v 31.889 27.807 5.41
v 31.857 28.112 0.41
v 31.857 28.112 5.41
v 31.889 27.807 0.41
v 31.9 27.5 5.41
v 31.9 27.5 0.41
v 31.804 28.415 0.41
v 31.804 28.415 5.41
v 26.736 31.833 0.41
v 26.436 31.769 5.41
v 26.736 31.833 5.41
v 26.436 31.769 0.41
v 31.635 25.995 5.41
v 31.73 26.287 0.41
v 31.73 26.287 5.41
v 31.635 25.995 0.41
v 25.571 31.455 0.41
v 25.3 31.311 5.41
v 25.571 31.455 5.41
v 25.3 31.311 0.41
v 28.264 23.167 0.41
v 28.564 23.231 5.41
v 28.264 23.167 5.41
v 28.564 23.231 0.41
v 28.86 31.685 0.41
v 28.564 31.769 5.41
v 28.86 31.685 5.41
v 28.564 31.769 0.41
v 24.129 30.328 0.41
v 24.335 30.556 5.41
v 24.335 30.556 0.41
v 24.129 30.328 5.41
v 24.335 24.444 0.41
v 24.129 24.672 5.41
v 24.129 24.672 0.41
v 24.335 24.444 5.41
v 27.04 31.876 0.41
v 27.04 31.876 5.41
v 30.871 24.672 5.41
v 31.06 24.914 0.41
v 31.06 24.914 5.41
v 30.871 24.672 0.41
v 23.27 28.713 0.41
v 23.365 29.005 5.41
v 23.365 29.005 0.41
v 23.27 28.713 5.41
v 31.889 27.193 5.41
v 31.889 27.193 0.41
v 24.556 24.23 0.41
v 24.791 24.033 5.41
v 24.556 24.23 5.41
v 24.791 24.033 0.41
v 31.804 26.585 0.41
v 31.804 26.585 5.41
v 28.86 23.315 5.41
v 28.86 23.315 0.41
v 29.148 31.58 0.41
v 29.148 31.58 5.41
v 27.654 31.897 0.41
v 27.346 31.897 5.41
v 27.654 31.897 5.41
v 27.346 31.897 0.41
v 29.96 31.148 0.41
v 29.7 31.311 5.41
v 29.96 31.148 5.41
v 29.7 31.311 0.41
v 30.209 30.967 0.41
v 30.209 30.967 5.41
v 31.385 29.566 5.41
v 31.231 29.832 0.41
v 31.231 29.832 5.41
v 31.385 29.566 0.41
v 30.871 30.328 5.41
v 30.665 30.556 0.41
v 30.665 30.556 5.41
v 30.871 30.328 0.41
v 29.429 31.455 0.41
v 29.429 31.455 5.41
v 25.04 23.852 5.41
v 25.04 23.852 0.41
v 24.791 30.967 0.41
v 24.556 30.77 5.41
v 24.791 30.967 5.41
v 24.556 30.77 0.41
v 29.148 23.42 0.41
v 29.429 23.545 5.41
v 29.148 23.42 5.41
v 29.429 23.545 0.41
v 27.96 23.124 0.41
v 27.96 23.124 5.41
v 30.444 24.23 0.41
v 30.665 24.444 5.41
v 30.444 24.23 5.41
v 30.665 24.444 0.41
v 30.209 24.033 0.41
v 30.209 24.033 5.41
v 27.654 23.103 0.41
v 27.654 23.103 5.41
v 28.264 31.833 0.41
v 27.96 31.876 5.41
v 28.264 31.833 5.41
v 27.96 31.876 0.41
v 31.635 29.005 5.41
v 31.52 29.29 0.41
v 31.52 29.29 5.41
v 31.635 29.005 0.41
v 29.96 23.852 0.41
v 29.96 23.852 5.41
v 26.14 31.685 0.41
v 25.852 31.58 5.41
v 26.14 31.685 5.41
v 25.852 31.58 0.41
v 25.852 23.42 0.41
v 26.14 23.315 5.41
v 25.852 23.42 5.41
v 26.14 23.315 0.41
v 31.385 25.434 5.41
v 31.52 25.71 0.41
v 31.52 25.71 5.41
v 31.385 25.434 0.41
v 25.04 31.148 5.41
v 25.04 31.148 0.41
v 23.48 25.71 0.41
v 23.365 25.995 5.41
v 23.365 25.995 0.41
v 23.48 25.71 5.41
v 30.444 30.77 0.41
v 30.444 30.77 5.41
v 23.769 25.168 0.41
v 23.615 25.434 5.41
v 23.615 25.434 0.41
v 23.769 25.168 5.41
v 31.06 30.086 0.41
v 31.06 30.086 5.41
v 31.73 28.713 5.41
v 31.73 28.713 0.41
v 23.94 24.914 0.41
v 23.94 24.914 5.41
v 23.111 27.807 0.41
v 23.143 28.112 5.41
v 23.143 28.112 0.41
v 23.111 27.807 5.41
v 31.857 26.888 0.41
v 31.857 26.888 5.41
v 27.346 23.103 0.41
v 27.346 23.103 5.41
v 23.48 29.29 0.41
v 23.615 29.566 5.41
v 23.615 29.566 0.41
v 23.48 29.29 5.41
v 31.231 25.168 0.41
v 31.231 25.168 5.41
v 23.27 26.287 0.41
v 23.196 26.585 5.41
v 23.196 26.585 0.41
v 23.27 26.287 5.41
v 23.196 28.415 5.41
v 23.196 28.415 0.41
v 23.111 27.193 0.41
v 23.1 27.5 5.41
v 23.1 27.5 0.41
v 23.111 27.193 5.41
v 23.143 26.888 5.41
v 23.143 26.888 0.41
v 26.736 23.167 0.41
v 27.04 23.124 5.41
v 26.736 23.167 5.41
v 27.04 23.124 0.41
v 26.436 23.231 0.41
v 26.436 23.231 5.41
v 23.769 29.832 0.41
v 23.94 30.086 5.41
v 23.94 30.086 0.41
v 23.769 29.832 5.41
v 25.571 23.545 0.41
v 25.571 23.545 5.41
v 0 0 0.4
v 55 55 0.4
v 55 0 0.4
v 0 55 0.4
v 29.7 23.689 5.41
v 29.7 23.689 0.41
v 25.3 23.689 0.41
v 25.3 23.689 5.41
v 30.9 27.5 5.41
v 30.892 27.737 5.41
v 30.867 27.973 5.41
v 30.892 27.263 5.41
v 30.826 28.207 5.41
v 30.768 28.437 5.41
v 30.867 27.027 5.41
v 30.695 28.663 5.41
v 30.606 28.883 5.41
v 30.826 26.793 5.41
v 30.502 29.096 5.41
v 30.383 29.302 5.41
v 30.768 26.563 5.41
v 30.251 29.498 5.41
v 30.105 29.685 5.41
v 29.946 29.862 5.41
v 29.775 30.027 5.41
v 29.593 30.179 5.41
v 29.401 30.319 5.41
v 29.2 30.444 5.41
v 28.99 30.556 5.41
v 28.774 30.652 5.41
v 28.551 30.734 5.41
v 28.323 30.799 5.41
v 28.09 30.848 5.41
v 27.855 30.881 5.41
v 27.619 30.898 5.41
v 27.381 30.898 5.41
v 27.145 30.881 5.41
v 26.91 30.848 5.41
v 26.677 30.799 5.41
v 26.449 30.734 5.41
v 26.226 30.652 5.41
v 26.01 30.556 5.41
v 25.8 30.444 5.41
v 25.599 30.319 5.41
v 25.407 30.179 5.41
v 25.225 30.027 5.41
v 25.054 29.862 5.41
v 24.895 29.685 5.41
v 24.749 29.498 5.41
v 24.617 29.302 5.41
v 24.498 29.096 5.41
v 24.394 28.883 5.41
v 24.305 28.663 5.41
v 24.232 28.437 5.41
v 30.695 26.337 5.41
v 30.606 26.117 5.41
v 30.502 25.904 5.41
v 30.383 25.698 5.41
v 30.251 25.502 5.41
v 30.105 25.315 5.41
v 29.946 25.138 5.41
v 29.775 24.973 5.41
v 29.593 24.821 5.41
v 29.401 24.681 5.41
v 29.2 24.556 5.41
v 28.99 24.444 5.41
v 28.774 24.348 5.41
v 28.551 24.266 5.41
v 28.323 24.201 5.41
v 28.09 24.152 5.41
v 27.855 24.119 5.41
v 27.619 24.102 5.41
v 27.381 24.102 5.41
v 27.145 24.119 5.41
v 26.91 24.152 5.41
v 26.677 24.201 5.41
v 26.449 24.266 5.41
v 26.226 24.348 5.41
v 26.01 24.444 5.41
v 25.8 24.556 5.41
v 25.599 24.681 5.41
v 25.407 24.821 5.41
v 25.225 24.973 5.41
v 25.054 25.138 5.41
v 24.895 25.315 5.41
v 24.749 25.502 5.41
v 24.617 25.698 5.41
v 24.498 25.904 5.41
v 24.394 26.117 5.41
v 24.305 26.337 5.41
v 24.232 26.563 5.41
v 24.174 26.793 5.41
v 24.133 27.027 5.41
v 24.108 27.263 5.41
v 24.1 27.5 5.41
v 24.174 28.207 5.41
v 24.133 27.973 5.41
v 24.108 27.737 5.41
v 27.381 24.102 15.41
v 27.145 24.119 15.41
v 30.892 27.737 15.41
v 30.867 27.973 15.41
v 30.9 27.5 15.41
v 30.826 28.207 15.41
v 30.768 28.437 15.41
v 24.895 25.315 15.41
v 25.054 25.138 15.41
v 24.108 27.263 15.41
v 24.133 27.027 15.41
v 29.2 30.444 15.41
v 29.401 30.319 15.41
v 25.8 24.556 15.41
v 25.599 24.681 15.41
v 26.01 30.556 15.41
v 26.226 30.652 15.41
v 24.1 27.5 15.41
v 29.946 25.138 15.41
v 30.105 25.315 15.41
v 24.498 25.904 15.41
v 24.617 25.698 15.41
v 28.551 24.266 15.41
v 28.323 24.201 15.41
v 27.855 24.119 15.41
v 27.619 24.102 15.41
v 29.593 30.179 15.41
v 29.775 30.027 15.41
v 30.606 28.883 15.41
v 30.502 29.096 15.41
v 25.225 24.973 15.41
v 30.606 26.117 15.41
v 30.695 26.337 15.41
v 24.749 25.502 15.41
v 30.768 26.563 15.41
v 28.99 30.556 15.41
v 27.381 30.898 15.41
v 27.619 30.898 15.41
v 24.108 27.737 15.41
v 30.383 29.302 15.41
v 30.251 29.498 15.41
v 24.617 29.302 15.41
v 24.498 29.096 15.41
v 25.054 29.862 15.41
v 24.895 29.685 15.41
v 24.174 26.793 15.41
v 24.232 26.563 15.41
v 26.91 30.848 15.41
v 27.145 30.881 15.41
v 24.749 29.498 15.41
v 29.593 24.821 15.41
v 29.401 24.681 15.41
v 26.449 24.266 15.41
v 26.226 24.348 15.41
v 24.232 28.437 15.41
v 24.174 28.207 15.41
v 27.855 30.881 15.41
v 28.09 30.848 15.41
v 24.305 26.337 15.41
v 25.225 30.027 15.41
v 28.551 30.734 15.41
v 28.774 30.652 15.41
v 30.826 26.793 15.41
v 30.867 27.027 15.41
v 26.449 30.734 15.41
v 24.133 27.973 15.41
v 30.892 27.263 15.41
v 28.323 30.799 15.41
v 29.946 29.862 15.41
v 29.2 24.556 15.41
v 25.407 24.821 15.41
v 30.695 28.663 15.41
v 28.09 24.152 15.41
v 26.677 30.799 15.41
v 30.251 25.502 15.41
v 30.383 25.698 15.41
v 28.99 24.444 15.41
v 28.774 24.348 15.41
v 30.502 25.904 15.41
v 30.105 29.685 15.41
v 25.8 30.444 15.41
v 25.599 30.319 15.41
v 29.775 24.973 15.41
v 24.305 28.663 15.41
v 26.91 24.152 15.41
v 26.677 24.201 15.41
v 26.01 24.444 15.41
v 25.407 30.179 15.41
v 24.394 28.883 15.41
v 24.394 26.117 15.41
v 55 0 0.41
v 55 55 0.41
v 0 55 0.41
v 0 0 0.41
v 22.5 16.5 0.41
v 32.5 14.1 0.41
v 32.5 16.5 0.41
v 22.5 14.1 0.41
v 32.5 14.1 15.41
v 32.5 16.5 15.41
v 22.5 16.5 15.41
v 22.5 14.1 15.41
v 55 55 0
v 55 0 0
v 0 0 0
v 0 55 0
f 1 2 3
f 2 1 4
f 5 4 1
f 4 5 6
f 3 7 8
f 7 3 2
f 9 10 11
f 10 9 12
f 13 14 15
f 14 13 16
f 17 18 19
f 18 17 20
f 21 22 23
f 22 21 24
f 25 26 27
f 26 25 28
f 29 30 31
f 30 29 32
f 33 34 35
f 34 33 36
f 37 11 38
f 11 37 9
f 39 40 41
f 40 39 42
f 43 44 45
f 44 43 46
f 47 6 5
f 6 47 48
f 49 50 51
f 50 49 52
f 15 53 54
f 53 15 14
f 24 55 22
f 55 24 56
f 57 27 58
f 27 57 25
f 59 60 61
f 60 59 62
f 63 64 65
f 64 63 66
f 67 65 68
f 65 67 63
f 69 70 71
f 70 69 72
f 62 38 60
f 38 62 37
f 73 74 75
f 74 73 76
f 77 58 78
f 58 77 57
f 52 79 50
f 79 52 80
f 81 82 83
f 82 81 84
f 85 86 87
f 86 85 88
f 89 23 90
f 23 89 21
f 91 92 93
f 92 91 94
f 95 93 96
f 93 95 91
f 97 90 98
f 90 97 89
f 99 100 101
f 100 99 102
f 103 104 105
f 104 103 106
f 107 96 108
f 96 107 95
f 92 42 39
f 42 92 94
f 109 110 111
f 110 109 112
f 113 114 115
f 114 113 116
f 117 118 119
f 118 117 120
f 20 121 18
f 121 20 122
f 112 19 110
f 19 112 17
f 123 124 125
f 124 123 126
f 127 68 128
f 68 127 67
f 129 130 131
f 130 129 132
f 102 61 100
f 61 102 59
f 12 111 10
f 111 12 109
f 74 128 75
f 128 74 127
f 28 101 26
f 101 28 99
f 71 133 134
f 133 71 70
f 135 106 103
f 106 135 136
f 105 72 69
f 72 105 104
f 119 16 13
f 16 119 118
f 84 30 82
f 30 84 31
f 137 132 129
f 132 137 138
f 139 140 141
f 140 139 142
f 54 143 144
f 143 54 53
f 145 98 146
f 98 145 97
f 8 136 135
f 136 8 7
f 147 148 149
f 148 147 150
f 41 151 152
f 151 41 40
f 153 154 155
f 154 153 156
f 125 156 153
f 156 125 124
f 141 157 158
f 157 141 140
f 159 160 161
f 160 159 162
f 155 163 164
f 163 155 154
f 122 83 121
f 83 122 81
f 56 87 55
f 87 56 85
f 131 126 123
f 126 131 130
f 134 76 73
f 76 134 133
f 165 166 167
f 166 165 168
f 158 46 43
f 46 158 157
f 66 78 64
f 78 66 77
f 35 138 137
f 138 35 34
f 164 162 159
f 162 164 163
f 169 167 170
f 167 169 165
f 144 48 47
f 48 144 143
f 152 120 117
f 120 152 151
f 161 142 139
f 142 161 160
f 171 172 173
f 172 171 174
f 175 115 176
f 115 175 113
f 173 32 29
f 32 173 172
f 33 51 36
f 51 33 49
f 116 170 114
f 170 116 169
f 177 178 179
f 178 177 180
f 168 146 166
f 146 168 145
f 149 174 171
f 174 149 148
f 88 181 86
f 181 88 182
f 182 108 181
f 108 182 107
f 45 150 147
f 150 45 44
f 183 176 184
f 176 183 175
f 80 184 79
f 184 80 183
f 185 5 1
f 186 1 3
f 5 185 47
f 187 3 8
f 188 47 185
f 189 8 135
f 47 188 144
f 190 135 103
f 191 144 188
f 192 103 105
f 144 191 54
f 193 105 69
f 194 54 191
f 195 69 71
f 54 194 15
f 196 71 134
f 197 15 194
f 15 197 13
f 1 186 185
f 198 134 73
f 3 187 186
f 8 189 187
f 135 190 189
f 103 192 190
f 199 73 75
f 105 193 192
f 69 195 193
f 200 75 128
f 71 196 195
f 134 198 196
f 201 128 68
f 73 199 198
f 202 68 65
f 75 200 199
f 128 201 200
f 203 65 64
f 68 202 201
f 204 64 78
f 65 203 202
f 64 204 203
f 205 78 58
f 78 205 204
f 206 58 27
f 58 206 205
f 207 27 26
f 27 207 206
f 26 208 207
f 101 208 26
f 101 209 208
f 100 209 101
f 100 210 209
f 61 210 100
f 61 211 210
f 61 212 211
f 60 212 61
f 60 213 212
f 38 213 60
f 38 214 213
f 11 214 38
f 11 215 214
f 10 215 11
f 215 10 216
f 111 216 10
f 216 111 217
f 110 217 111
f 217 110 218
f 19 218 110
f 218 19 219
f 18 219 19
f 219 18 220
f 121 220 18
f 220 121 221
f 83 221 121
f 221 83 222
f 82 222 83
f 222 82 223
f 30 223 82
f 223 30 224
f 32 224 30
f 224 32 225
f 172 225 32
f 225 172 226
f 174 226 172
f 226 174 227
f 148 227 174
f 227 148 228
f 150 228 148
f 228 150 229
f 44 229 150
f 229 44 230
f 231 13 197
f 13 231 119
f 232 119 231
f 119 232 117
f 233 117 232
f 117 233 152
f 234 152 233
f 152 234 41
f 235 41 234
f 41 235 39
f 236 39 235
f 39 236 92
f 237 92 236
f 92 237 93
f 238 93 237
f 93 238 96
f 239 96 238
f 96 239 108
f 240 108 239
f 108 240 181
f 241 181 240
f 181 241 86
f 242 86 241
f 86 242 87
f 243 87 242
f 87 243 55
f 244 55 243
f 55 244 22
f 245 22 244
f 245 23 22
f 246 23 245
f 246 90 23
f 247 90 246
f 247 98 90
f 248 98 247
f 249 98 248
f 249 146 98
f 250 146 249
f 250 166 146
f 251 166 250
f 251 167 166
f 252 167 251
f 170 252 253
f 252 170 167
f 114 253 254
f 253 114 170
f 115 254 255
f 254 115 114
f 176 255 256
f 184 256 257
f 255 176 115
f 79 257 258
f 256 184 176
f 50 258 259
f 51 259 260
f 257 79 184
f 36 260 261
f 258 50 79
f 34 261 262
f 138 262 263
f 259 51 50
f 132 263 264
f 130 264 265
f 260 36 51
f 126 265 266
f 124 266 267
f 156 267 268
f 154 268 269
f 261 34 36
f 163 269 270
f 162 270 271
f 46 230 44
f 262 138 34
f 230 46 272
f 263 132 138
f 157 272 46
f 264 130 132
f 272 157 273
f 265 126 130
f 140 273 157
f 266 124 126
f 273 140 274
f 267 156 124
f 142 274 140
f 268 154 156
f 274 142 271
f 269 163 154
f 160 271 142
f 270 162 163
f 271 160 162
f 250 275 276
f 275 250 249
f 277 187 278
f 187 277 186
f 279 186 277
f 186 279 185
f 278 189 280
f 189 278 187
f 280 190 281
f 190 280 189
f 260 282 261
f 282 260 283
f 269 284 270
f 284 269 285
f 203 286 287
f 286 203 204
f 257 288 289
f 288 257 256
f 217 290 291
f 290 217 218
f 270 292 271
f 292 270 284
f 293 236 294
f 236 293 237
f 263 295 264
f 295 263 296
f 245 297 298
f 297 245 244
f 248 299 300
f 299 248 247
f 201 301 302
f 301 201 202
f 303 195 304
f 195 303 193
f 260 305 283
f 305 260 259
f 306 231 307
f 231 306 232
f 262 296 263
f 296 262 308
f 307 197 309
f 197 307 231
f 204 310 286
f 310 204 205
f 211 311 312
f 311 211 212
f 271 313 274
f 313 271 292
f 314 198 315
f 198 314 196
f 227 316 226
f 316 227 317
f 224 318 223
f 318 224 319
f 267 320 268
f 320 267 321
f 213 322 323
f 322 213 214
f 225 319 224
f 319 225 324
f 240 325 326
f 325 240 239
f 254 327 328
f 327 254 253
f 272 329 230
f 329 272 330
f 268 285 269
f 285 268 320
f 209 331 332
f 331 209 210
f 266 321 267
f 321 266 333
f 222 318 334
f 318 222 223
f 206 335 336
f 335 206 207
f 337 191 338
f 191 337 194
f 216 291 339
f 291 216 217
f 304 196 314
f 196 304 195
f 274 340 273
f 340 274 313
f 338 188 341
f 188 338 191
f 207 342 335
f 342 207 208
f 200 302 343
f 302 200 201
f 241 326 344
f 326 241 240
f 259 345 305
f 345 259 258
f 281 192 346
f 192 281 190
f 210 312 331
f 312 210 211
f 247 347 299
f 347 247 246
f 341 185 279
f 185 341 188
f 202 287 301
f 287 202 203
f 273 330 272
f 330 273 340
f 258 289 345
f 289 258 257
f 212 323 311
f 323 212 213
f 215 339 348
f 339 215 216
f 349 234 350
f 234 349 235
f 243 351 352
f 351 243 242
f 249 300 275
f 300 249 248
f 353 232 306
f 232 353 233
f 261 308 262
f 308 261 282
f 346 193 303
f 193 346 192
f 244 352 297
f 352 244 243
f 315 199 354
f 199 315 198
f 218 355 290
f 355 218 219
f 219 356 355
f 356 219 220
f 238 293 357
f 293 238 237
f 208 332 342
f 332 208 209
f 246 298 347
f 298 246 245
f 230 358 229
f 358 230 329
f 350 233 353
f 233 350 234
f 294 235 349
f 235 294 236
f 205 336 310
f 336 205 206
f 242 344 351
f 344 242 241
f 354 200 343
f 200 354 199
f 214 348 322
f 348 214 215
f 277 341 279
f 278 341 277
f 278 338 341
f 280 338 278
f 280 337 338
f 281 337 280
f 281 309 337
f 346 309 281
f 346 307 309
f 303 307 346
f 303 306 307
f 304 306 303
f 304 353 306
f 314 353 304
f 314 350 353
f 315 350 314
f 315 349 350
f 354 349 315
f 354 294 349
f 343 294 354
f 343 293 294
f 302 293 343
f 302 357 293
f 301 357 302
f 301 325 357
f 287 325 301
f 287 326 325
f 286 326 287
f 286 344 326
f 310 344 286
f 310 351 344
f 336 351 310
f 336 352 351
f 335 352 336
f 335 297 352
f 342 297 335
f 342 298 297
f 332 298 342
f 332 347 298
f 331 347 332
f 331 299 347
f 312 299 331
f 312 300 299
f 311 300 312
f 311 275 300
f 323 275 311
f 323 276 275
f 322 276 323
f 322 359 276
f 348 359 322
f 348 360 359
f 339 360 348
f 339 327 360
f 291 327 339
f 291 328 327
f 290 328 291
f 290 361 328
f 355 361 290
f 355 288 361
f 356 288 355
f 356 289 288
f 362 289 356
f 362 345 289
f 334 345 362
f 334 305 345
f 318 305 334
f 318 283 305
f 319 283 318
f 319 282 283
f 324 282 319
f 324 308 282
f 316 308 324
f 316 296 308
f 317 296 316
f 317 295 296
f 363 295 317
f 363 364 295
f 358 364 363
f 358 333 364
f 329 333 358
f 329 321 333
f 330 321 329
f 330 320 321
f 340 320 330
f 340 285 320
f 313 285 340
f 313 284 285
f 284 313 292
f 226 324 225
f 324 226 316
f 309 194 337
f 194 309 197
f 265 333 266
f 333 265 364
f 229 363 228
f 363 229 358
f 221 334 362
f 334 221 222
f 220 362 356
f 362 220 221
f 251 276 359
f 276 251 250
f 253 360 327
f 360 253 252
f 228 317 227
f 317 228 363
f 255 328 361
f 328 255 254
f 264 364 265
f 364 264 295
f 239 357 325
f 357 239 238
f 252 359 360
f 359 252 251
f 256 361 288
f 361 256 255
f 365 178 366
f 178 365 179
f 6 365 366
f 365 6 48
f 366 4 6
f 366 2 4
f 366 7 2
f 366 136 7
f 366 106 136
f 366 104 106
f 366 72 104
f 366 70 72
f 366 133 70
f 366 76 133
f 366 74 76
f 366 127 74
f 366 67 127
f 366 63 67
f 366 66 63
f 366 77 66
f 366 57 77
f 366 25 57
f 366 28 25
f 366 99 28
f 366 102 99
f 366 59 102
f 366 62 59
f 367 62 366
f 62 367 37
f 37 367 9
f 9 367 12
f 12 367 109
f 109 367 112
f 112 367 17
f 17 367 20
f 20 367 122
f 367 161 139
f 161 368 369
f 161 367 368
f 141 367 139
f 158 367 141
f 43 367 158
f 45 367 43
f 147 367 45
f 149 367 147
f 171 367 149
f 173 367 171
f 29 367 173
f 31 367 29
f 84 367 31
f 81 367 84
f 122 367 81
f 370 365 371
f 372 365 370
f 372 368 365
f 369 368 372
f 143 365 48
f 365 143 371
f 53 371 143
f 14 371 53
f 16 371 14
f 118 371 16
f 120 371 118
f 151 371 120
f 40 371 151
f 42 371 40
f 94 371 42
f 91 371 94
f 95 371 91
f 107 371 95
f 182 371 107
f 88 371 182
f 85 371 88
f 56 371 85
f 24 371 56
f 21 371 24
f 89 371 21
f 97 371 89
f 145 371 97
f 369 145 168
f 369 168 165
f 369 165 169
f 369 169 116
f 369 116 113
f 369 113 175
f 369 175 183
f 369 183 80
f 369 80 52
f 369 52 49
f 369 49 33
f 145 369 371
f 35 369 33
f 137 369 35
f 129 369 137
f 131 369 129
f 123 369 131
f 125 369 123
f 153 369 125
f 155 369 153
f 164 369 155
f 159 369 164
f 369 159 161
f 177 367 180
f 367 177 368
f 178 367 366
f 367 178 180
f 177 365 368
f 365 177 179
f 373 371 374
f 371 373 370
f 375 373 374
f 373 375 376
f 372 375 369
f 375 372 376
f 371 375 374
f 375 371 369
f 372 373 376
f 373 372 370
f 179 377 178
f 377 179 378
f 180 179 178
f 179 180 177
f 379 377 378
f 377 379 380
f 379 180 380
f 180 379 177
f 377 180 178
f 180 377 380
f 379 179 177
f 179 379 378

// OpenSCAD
// file: ../../Base/Rotation.scad
// Fischertechnik Box Foundation
// Geometry Helpers Rotation

include <PlacementOptions.scad>

// getRotatedSpace(space, rotation=NoRotation)
// Rotates the space dependent on the specified rotation

function getRotatedSpace(space, rotation=NoRotation) = [
    (rotation == Rotate90 || rotation == Rotate270) ? space.y : space.x,
    (rotation == Rotate90 || rotation == Rotate270) ? space.x : space.y
];

// Rotates the given space around the fixed left lower corner
// space = the space the children needs as width/depth list [width,depth]
// rotation = 0 Rotate0 degrees, 1 Rotate90 degrees, 2 Rotate180 degrees, 3 Rotate270 degrees (equivalent to -90)

module RotateFix(space, rotation=NoRotation) {
    dy = (rotation == Rotate0 || rotation == Rotate270) ? 0 :
        (rotation == Rotate90) ? space.x :
        space.y;
    dx = (rotation < Rotate180) ? 0 :
        (rotation == Rotate180) ? space.x :
        space.y;
    
    translate([dx, dy, 0])
        rotate([0, 0, rotations[rotation]])
            children();
}
// file: ../../Base/Alignment.scad
// Fischertechnik Box Foundation
// Geometry Helpers Alignment

include <PlacementOptions.scad>

// getAlignedX(elementWidth, spaceWidth, align=AlignRight, offset=0)
// Gets the aligned X offset of an element with the given
// width in the given space.
// elementWidth = The width of the element to positon
// spaceWidth = The space where the element should be aligned
// align = 0 AlignLeft, 1 AlignCenter, 2 AlignRight
// offset = an optional offset from the aligned position. When
// aligned left or centered, then positive values are in X direction.
// When aligned right then positive values are in negative X direction.

function getAlignedX(elementWidth, spaceWidth, align=AlignRight, offset=0) =
    (align == AlignLeft) ?
        offset :
        ((align == AlignCenter) ?
        (spaceWidth - elementWidth)/2 + offset :
        spaceWidth - offset - elementWidth);

// getAlignedY(elementDepth, spaceDepth, align=AlignTop, offset=0)
// Gets the aligned Y offset of an element with the given
// depth in the given space.
// elementDepth = The depth of the element to positon
// spaceDepth = The space where the element should be aligned
// align = 0 AlignBottom, 1 AlignCenter, 2 AlignTop
// offset = an optional offset from the aligned position. When
// aligned bottom or centered, then positive values are in Y direction.
// When aligned top then positive values are in negative Y direction.

function getAlignedY(elementDepth, spaceDepth, align=AlignTop, offset=0) =
    (align == AlignBottom) ?
        offset :
        ((align == AlignCenter) ?
        (spaceDepth - elementDepth)/2 + offset :
        spaceDepth - offset - elementDepth);
// file: ../../Base/PlacementOptions.scad
// Fischertechnik Box Foundation
// Placement Options

// Alignment
NoAlign = 0;
AlignLeft = 1;
AlignBottom = 2;
AlignCenter = 3;
AlignRight = 4;
AlignTop = 5;

// Element rotation degree steps
rotations = [0, -90, -180, -270];

// Rotation
NoRotation = 0;
Rotate0 = 0;
Rotate90 = 1;
Rotate180 = 2;
Rotate270 = 3;

// Docking (seen from above)
NoDock = -1;
DockLeft = 0;
DockTop = 1;
DockRight = 2;
DockCorner = 2;
DockBottom = 3;

// Web corners
LowerLeft = 0;
UpperLeft = 1;
UpperRight = 2;
LowerRight = 3;

// Web position relative to corner
LeftOfCorner = 0;
RightOfCorner = 1;

// Rails direction
Horizontal = true;
Vertical = false;
// file: ../../Base/Boxes.scad
// Fischertechnik Box Foundation
// Pre-designed Boxes

use <Constants.scad>

include <PlacementOptions.scad>

box190Width = 190;
box190Depth = 130;
box130Width = 130;
box130Depth = 95;

// Values are from an original ec3 box
topBottomDifference = 1.5;
outerHeight = 40;
baseThickness = 1.8;
innerHeight = outerHeight - baseThickness;
stackExcess = 5.7;
radius = 3.5;
wallThickness = 1.5;
tolerance = 0.2;

boxWallThickness = wallThickness;
boxBaseThickness = baseThickness;
boxWebWidth = 3.0;

// getBoxWallThickness()
// Gets the wall thickness of a Fischertechnik Box
function getBoxWallThickness() = boxWallThickness;

// getBoxUsageHeight(height = 38.2)
// Gets the usable height of a Fischertechnik box
// height = Outer height of the box from the bottom to the upper edge.
function getBoxUsageHeight(height = outerHeight) = height - baseThickness - stackExcess;

// getBoxInnerHeight()
// Gets the inner height of a Fischertechnik box, including the stack excess
function getBoxInnerHeight() = innerHeight;

// getBoxBaseThickness()
// Gets the thickness of the Fischertechnik box base.
function getBoxBaseThickness() = boxBaseThickness;

// getBoxWebWidth()
// Gets the width of a box web
function getBoxWebWidth() = boxWebWidth;

// getBox190Space()
// Gets the usable inner space of a Box 190 as an x/y-list
function getBox190Space() = [
    box190Width - 2*getBoxWallThickness() - topBottomDifference, 
    box190Depth - 2*getBoxWallThickness() - topBottomDifference ];

// RoundedCornerPlate(width, depth, height, radius)
// Creates a body plate with rounded corners for a box. Used
// also to create the complete box with the hull module.
// width = Width of the plate
// depth = depth of the plate 
// height = thickness of the plate
// radius = radius of the rounded corner
module RoundedCornerPlate(width, depth, height, radius) {
    translate([radius, radius])
    hull() {
        w = width-2*radius;
        d = depth-2*radius;
        cube([w, d, height]);
        cylinder(height, r=radius, $fn=getFragments());
        translate([w, 0])
            cylinder(height, r=radius, $fn=getFragments());
        translate([w, d])
            cylinder(height, r=radius, $fn=getFragments());
        translate([0, d])
            cylinder(height, r=radius, $fn=getFragments());
    }
}

// BoxBase(width, depth)
// Creates an empty stackable Fischertechnik compatible box
// width = Outer width of the box (190, 130, ...)
// depth = Outer depth of the box (130, 95, ...)

module BoxBase(width, depth, height=outerHeight) {    
    thinPlate = 0.01;

    innerHeight = height - baseThickness;    
    
    module Body(tolerance=tolerance) {
        hull() {
            // Bottom with tolerance to fit into the original boxes when stacked
            translate([-wallThickness+tolerance, -wallThickness+tolerance, -baseThickness])
                RoundedCornerPlate(width-topBottomDifference-2*tolerance, depth-topBottomDifference-2*tolerance, thinPlate, radius);
            
            // Top
            translate([-wallThickness-topBottomDifference/2, -wallThickness-topBottomDifference/2, innerHeight-thinPlate])
                RoundedCornerPlate(width, depth, thinPlate, radius);
         }
    }

    module Cutoff() {
        hull() {
            coWidth = width - 2*wallThickness;
            coDepth = depth - 2*wallThickness;
            
            // Bottom
            RoundedCornerPlate(coWidth-topBottomDifference, coDepth-topBottomDifference, thinPlate, radius);

            // Top
            translate([-topBottomDifference/2, -topBottomDifference/2, innerHeight+thinPlate]) 
                RoundedCornerPlate(coWidth, coDepth, thinPlate, radius);
        }
    }
    
    difference() {        
        Body();
        Cutoff();
        stackOffset = innerHeight - stackExcess;
        translate([0, 0, stackOffset + baseThickness])
            Body(tolerance=0);
    }
}

// Creates the Fischertechnik empty box 130x190 mm and places it at position 0,0
// 190x130 are the outer sizes, the inner space is slightly smaller. Use getBox190Space() to get the inner sizes.
// The box is positioned that the usable inner space is at the 0,0,0 position.

module Box190() {
    BoxBase(box190Width, box190Depth);
}

// Gets the usable inner space of a Box 130 as an x/y-list
function getBox130Space() = [
    box130Width - 2*getBoxWallThickness() - topBottomDifference, 
    box130Depth - 2*getBoxWallThickness() - topBottomDifference ];

// Creates the Fischertechnik empty box 95x130 mm and places it at position 0,0
// 190x130 are the outer sizes, the inner space is slightly smaller. Use getBox190Space() to get the inner sizes.
// The box is positioned that the usable inner space is at the 0,0,0 position.

module Box130() {
    BoxBase(box130Width, box130Depth);
}

// Creates a web at the specified box walls
// corner 0 = LowerLeft, 1 = UpperLeft, 2 = UpperRight, 3 = LowerRight
// side 0 = LeftOfCorner, 1 = RightOfCorner
// distance = Distance in mm from the corner
// boxSpace = inner width and depth of the box (default: Box 190)
// webWidth = length of the web (default is 3 mms)
// webThickness = thickness of the web (default is 1 mm)
// height = Height of the web (standard is getBoxUsageHeight())
// sink = How much of the web is sunk into the wall

module BoxWeb(
    corner, 
    side, 
    distance, 
    boxSpace=getBox190Space(), 
    webWidth=getBoxWebWidth(), 
    webThickness=1.0, 
    height=getBoxUsageHeight(),
    sink = getBoxWallThickness()/2) {
    width = (corner % 2 == 0) ? 
            (side == LeftOfCorner ? webWidth : webThickness) :
            (side == LeftOfCorner ? webThickness : webWidth);

    depth = (corner % 2 == 0) ? 
            (side == RightOfCorner ? webWidth : webThickness) :
            (side == RightOfCorner ? webThickness : webWidth);
    
    xDiff = corner == LowerLeft ? 
                (side == LeftOfCorner ? -sink : distance) :
            (corner == UpperLeft ?                
                (side == LeftOfCorner ? distance : -sink) :
            (corner == UpperRight ?
                (side == LeftOfCorner ? boxSpace.x-webWidth+sink : boxSpace.x-distance-webThickness) :
                (side == LeftOfCorner ? boxSpace.x-distance-webThickness: boxSpace.x-webWidth+sink)));

    yDiff = corner == LowerLeft ? 
                (side == RightOfCorner ? -sink : distance) :
            (corner == UpperLeft ?
                (side == RightOfCorner ? boxSpace.y-distance-webThickness : boxSpace.y-webWidth+sink) :
            (corner == UpperRight ?
                (side == RightOfCorner ? boxSpace.y-webWidth+sink : boxSpace.y-distance-webThickness) :
                (side == RightOfCorner ? distance : -sink)));
    
    translate([xDiff, yDiff, -getExcess()])
        cube([width, depth, height + 2*getExcess()]);
}
// file: ../../Base/Placement.scad
// Fischertechnik Box Foundation
// Geometry Helpers Placement

use <Constants.scad>
use <Alignment.scad>
use <Rotation.scad>
use <Boxes.scad>

include <PlacementOptions.scad>

// Place(x=0, y=0, elementSpace=[0,0], alignX=AlignLeft, alignY=AlignBottom, rotation=Rotate0, boxSpace=getBox190Space())
// Places the child at the specified position
// y = Y-Position. This is a relative position when an X aligment is specified.
// x = X-Position. This is a relative position when an Y aligment is specified.
// elementSpace = space of the element to be placed [x,y]
// alignX = -1=NoAlign, 0 AlignLeft, 1 AlignCenter, 3 AlignRight (elementSpace and boxSpace required!)
// alignY = -1=NoAlign, 2 AlignBottom, 1 AlignCenter, 4 AlignTop (elementSpace and boxSpace required!)
// rotation = 0 Rotate0 0 degrees, 1 Rotate90 90 degrees, 
// 2 Rotate180 180 degrees, 3 Rotate270 270 degrees (equivalent to -90)
// boxSpace = Inner space of the box where the placement occurs [x,y] - default is Box 190x130 inner space

module Place(x=0, y=0, elementSpace=[0,0], 
  alignX=AlignLeft, alignY=AlignBottom, 
  rotation=NoRotation, boxSpace=getBox190Space()) {

    module Position(x, y, space, rotation=Rotate0) {
        translate([x, y, 0])
            RotateFix(space, rotation)
                children();
    }

    space = getRotatedSpace(elementSpace, rotation);
    alignedX = getAlignedX(space.x, boxSpace.x, alignX, x);
    alignedY = getAlignedY(space.y, boxSpace.y, alignY, y);
    Position(alignedX, alignedY, elementSpace, rotation)
        children();
}

// Center(space=getBox130Space(), elementSpace=[0,0])
// space = Space where the children is centered. For cylinder use centered=true and no elementSpace.
// elementSpace = space of the element to be centered [x,y]

module Center(space=getBox190Space(), elementSpace=[0,0]) {
    Place(elementSpace=elementSpace, boxSpace=space, alignX=AlignCenter, alignY=AlignCenter)
        children();
}

// CenterHorizontal(width=0, y=0, offset=0, space=getBox130Space())
// width = Width of the element to be placed.
// y = Y position of the element
// offset = Offset from the center position (negative will be left of the center)
// space = Space where the element is placed

module CenterHorizontal(width=0, y=0, offset=0, space=getBox190Space()) {
    Place(x=offset, y=y, elementSpace=[width, 0], boxSpace=space, alignX=AlignCenter)
        children(0);
}

// CenterVertical(depth=0, x=0, offset=0, space=getBox130Space())
// depth = Depth of the element to be placed.
// x = X position of the element
// offset = Offset from the center position (negative will be down of the center)
// space = Space where the element is placed

module CenterVertical(depth=0, x=0, offset=0, space=getBox190Space()) {
    Place(x=x, y=offset, elementSpace=[0, depth], boxSpace=space, alignY=AlignCenter)
        children(0);
}

// getIsVertical(align)
// True if the specified alignment needs a vertical orientation for a divider (AlignRight, AlignLeft)

function getIsVertical(align) = (align == AlignRight || align == AlignLeft);

// getIsHorizontal(align)
// True if the specified alignment needs a horizontal orientation for a divider (AlignTop, AlignBottom)

function getIsHorizontal(align) = (align == AlignTop || align == AlignBottom);
// file: ../../Elements/AxisClip10.scad
// Fischertechnik Box Library
// Axis for clip 10
// 31023

use <../ModelBase/Simple.scad>
use <../Base/Constants.scad>

/* [Element Parameters] */
height = 23;
clipHeight = 10;

/* [Hidden] */
width = 12;
depth = 12;
upperDiameter = 3.6;

// getAxisClip10Space()
// Gets the space of a n axis for a clip 10 with spring ring (mot2)

function getAxisClip10Space() = [width, depth, height];

// AxisClip10(height, clipHeight)
// Axis for clip 10 with spring ring (mot2)
// height = Height of the complete axis (standard is 23, in mot3 its only 12)
// clipHeight = Height of the part for the clip (standard is 10, in mot3 its only 7)

module AxisClip10(height=height, clipHeight=clipHeight) {
    LeveledAxisWithSpace(height, height-clipHeight, getAxisClip10Space(), diameter=upperDiameter);
}

// Test
color("lightgray")
AxisClip10(height, clipHeight);
// file: ../../Base/Constants.scad
// Fischertechnik Box Foundation
// Constants

// Constant values necessary for multiple elements

// Base constants
dividerThickness = 1.2;
excess = 0.01;
fragments = 90;
tolerance = 0.8;

// Gets the thickness of a divider 
function getDividerThickness() = dividerThickness;

// Gets the excess that is used to merge walls into each other
function getExcess() = excess;

// Gets amount of fragments of a cylinder
function getFragments() = fragments;

// Gets the inner tolerance of a frame to each side
function getTolerance() = tolerance;


// Fischertechnik specific constants
axisDiameter = 4;
axisBottomDiameter = axisDiameter + 1;
axisTolerance = 0.2;
axisLockingLength = 8;

// Gets axis diameter of Fischertechnik axis
function getAxisDiameter() = axisDiameter;

// Gets axis diameter tolerance (subtracted for element axis)
function getAxisTolerance() = axisTolerance;

// Gets the axis diameter for standing axis
function getStandAxisDiameter() = getAxisDiameter() - getAxisTolerance();

// Gets axis bottom diameter for thicker part at the bottom
function getAxisBottomDiameter() = axisBottomDiameter;

// Gets the lengthh of the locking part of a locking axis
function getAxisLockingLength() = axisLockingLength;

// Studs

studHeight = 2.5;
studTolerance = 0.2;

// gets the height of a connecting stud
function getStudHeight() = studHeight;

// gets the connecting stud height tolerance
function getStudTolerance() = studTolerance;

// Dockable Frame with Edge

standardEdgeDistance = 2.5;
standardWebDistance = 11.5;
standardCornerLength = 15;

// gets the standard distance to the wall of the box for dockable frames with webs
function getStandardEdgeDistance() = standardEdgeDistance;

// gets the standard distance of each web to the corner of the dockable frame
function getStandardWebDistance() = standardWebDistance;

// gets the standard length of the corner walls of a dockable frame
function getStandardCornerLength() = standardCornerLength;

// Tubes

tubeWallFactor = 0.8;

// gets the wall thickness of a tube.
function getTubeWallThickness() = tubeWallFactor * getDividerThickness();

// Small Parts and Divider Frame

smallPartsFrameHeight = 20;

// gets the frame height for docked small parts boxes.
function getSmallPartsFrameHeight() = smallPartsFrameHeight;

// Hubs

hubRingDiameter = 19.5;
hubRingLevelDiameter = 21;

// gets the diameter of a tube matching the inner ring of a wheel
function getHubRingDiameter() = hubRingDiameter;

// gets the diameter of a hub tube with a thicker diameter
function getHubRingLevelDiameter() = hubRingLevelDiameter;

// Struts

strutAddLength = 9.0;
strutDepth = 8.0;

// gets the full length of a strut
function getFullStrutLength(length) = length + strutAddLength;

// gets the radius of the end of a strut
function getStrutEndRadius() = strutAddLength / 2;

// gets the the depth of a strut
function getStrutDepth() = strutDepth;

// Propeller

propellerAxisDiameter = 7.0;
propellerAxisTolerance = 0.2;

// gets the propeller axis outer diameter
function getPropellerAxisDiameter() = propellerAxisDiameter;

// gets the propeller axis printing tolerance
function getPropellerAxisTolerance() = propellerAxisTolerance;
// file: ../../Elements/HolderPropellerFourBlades.scad
// Fischertechnik Box Library
// Holder for four blade propeller
// 36337

use <../Base/Constants.scad>
use <../ModelBase/Simple.scad>

/* [Hidden] */
width = 55;
depth = 55;
height = 15;

// getHolderPropellerFourBladesSpace()
// gets the space for a four blade propeller when placed as an "X".

function getHolderPropellerFourBladesSpace() = [width, depth, height];

// HolderPropellerFourBlades()
// Holder for a four blade propeller when placed as an "X".

module HolderPropellerFourBlades() {
    propellerThickness = 5;
    diameter = getPropellerAxisDiameter() - getPropellerAxisTolerance();
    LeveledAxisWithSpace(
        height, 
        levelHeight=propellerThickness, 
        space=getHolderPropellerFourBladesSpace(),
        diameter=diameter,
        baseDiameter=diameter + 2);
    volume = [10, getDividerThickness()*2, height];
    x = (getHolderPropellerFourBladesSpace().x - volume.x) / 2;
    y = getHolderPropellerFourBladesSpace().y/ 2 - volume.y - 11;
    translate([x, y])
        Wall(volume);
}

// Test
color("lightgray")
HolderPropellerFourBlades();
// file: ../TestPrint.scad
// 3D Print Test Base

use <../Base/Constants.scad>

use <../Elements/AxisClip10.scad>

module TestPrint(elementSpace) {
    cube([elementSpace.x, elementSpace.y, 0.4]);
    translate([0,0,0.4+getExcess()]) {
        children();
    }
}

TestPrint(getAxisClip10Space())
    AxisClip10();
// main file
// 3D Print Test
// HolderPropellerFourBlades

use <../TestPrint.scad>
use <../../Elements/HolderPropellerFourBlades.scad>

TestPrint(getHolderPropellerFourBladesSpace())
    HolderPropellerFourBlades();
